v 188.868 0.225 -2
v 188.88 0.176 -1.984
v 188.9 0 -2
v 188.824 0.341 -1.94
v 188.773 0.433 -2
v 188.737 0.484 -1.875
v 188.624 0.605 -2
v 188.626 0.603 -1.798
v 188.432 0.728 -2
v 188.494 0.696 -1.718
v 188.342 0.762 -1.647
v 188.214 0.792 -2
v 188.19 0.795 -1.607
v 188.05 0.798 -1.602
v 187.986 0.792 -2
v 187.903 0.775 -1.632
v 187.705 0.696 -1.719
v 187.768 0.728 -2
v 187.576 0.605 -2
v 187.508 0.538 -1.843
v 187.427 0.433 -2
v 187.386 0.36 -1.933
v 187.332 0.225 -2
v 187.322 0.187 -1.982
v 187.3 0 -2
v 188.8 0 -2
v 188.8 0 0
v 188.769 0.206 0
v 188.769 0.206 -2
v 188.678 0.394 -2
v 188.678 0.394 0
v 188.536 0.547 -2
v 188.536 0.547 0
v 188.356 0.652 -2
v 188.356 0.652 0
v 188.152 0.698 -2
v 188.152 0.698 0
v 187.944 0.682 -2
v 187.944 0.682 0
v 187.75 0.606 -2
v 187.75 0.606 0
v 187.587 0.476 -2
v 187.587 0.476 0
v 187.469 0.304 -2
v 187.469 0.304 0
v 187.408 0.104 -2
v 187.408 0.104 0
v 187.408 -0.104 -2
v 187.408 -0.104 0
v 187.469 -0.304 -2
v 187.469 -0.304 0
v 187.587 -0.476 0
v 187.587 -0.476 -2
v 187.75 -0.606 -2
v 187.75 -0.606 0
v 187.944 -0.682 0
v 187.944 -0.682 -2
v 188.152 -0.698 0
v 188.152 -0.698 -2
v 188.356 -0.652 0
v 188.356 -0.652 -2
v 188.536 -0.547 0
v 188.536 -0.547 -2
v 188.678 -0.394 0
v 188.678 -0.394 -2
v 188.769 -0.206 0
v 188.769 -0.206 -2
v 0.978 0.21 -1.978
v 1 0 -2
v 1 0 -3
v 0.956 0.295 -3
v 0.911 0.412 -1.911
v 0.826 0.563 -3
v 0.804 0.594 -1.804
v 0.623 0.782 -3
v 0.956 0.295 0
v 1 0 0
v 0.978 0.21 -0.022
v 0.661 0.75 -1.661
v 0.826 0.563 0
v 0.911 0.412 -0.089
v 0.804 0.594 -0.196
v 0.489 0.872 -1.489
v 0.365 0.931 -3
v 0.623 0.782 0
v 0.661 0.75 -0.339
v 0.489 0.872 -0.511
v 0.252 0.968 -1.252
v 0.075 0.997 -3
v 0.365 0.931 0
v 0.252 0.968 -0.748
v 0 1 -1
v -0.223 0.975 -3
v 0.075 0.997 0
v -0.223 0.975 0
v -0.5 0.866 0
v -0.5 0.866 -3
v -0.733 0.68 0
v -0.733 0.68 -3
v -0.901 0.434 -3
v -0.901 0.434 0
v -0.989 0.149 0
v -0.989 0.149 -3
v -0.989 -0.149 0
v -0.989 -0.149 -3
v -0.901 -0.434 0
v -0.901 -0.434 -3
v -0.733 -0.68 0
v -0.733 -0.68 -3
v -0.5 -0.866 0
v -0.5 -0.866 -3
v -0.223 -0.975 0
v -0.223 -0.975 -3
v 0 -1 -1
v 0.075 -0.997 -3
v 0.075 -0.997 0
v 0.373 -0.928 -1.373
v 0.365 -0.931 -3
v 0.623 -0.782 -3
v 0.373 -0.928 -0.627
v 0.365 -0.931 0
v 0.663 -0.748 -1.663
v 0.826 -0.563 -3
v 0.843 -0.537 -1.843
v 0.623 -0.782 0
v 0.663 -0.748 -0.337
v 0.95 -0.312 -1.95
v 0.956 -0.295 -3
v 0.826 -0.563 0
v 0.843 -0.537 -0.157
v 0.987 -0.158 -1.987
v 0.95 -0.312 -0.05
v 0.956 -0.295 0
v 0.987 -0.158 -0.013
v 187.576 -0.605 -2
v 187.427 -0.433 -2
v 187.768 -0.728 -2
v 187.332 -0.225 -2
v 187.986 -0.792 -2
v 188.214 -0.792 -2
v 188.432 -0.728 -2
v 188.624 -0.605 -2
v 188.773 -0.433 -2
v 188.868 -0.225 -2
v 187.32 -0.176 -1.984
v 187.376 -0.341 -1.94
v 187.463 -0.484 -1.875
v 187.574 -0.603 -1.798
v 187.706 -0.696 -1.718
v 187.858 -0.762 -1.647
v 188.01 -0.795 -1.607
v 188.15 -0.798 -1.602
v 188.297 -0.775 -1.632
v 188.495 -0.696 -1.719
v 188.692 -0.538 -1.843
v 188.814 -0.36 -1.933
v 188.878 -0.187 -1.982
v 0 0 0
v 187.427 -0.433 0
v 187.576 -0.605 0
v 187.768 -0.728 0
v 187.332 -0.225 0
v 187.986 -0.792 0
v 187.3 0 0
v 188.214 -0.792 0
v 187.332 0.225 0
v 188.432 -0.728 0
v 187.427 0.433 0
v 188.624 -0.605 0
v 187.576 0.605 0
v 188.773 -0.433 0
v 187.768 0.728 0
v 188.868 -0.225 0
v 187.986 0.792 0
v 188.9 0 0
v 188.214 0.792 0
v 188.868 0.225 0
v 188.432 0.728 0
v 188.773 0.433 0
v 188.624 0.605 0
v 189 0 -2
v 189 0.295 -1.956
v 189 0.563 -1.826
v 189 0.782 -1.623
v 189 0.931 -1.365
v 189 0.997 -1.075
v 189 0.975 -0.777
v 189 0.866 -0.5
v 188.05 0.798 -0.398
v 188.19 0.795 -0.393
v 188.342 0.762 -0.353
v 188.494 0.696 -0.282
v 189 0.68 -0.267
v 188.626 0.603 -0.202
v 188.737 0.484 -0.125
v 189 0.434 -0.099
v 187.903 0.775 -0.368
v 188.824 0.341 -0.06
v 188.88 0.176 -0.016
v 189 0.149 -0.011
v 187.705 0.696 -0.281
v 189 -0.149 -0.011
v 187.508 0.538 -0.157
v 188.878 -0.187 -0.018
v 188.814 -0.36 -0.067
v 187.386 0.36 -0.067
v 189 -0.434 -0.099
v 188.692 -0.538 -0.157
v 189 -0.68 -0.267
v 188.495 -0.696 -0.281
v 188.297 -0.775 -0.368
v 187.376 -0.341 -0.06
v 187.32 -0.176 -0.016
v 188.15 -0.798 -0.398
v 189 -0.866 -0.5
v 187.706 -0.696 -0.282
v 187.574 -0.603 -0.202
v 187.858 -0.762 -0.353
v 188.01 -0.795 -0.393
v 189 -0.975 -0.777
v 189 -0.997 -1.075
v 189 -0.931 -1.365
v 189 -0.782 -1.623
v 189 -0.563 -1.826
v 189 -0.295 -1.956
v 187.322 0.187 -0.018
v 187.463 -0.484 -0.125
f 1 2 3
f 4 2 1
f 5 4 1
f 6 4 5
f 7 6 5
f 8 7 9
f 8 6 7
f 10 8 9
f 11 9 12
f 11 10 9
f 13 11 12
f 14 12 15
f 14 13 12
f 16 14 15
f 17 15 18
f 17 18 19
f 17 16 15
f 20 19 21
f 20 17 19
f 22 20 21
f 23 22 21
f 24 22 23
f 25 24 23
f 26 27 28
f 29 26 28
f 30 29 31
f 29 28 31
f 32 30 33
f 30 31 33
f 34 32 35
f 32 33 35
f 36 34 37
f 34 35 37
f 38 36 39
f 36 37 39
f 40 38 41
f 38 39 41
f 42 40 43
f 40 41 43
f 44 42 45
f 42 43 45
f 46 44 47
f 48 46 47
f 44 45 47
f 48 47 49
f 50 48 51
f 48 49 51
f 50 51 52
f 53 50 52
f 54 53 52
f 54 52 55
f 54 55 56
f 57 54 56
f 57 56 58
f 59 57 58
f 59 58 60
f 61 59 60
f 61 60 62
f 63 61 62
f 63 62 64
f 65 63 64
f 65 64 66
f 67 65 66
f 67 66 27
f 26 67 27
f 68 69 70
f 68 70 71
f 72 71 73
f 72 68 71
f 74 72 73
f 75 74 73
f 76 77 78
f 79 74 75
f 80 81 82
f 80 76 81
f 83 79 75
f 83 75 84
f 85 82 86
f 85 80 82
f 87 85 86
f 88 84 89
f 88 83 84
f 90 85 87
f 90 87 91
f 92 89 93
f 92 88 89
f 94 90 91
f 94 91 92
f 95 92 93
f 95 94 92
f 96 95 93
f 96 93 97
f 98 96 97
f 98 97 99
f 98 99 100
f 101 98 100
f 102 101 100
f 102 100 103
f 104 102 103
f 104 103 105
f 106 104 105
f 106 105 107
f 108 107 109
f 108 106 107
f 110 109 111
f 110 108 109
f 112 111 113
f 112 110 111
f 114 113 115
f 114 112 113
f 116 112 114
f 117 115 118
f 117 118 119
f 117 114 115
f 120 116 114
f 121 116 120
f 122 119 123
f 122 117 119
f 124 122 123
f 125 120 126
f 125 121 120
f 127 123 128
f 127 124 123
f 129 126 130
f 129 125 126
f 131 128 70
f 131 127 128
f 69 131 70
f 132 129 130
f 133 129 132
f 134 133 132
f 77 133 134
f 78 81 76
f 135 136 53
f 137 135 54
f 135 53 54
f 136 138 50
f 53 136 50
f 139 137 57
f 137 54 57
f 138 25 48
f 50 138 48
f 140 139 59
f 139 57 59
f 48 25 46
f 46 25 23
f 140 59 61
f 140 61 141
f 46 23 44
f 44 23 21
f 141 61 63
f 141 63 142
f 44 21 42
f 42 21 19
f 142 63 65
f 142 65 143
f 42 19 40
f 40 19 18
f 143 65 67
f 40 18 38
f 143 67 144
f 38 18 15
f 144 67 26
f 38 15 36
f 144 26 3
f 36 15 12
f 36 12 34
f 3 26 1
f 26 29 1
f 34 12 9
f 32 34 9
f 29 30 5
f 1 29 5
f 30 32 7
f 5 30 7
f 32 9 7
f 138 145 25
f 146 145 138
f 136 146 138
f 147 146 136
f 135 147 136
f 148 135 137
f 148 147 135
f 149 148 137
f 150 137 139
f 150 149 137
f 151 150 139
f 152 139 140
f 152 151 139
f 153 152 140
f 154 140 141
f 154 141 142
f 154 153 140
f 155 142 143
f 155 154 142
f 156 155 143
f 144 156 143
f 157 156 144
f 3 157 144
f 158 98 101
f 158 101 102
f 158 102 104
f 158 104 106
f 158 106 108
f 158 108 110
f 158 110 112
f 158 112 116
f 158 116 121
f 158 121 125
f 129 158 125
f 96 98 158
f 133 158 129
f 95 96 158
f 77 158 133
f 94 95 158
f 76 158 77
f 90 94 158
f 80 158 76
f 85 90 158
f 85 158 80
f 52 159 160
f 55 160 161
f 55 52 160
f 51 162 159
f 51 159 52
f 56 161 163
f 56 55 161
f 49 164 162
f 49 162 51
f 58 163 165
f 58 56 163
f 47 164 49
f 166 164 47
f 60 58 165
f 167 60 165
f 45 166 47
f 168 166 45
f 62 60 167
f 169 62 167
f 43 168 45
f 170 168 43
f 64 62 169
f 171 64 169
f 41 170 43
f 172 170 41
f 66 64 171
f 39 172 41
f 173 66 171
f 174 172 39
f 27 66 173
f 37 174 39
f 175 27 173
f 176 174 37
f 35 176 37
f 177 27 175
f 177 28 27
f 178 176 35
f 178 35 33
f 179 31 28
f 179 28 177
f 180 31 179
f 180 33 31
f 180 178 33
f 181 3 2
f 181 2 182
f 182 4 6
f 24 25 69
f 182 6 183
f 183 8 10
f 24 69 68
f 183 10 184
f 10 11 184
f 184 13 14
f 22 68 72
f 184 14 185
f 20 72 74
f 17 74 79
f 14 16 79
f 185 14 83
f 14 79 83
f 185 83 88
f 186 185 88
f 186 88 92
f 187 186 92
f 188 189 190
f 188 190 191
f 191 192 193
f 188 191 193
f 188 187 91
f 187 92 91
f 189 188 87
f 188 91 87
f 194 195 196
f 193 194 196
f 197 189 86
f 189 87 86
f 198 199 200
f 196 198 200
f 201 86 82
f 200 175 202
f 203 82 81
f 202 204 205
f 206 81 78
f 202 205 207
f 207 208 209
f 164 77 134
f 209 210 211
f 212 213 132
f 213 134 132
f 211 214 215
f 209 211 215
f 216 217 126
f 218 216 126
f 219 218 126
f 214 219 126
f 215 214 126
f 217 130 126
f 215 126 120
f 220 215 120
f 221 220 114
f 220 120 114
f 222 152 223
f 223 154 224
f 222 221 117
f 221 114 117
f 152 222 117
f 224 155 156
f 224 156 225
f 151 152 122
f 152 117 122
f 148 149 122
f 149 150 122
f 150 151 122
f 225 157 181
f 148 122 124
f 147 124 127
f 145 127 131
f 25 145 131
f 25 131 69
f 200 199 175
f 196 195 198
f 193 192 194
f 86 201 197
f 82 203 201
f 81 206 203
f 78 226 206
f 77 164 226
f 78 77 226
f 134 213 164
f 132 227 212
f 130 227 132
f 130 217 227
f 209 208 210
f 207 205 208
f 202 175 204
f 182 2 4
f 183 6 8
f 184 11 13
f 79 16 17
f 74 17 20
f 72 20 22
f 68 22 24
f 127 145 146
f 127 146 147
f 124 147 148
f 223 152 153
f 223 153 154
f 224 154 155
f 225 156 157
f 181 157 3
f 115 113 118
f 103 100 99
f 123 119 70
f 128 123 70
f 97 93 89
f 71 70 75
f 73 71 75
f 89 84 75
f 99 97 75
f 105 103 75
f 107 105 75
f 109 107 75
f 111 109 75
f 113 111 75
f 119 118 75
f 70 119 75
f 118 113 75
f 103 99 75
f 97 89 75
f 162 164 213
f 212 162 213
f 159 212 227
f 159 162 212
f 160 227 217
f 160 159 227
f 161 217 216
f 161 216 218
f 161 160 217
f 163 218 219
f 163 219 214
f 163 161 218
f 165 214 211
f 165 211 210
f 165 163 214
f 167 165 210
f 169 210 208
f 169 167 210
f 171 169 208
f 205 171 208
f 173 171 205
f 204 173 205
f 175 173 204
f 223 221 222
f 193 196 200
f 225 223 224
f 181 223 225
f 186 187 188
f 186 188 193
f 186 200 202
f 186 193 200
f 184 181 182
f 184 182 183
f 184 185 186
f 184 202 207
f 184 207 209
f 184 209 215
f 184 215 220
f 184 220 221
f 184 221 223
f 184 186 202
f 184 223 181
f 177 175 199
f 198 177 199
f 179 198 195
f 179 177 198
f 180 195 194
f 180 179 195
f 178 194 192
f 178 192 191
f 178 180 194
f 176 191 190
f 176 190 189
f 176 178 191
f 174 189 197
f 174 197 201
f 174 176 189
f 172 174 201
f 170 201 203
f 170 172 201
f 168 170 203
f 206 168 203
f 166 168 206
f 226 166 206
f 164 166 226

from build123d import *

# Parameters (mm, degrees)
SKETCH_1_R          = 1
EXTRUDE_1_DEPTH     = 3
SKETCH_2_R          = 1
EXTRUDE_2_DEPTH     = 189
SKETCH_3_R          = 0.8
EXTRUDE_3_DEPTH     = 2
SKETCH_4_R          = 0.7
CUT_EXTRUDE_1_DEPTH = 4


with BuildPart() as part:
    # 草图1 → 凸台-拉伸1 (new body)
    with BuildSketch(Plane.XY):
        Circle(SKETCH_1_R)
    extrude(amount=-EXTRUDE_1_DEPTH)

    # 草图2 → 凸台-拉伸2 (add)
    with BuildSketch(Plane(origin=(0, 0, 0), x_dir=(0, 0, -1), z_dir=(1, 0, 0))):
        with Locations((1, 0)):
            Circle(SKETCH_2_R)
    extrude(amount=EXTRUDE_2_DEPTH)

    # 草图3 → 凸台-拉伸3 (add)
    with BuildSketch(Plane.XY):
        with Locations((188.1, 0)):
            Circle(SKETCH_3_R)
    extrude(amount=-EXTRUDE_3_DEPTH)

    # 草图4 → 切除-拉伸1 (cut, through all)
    with BuildSketch(Plane.XY):
        with Locations((188.1, 0)):
            Circle(SKETCH_4_R)
    extrude(amount=-CUT_EXTRUDE_1_DEPTH, mode=Mode.SUBTRACT)


solid = part.part
